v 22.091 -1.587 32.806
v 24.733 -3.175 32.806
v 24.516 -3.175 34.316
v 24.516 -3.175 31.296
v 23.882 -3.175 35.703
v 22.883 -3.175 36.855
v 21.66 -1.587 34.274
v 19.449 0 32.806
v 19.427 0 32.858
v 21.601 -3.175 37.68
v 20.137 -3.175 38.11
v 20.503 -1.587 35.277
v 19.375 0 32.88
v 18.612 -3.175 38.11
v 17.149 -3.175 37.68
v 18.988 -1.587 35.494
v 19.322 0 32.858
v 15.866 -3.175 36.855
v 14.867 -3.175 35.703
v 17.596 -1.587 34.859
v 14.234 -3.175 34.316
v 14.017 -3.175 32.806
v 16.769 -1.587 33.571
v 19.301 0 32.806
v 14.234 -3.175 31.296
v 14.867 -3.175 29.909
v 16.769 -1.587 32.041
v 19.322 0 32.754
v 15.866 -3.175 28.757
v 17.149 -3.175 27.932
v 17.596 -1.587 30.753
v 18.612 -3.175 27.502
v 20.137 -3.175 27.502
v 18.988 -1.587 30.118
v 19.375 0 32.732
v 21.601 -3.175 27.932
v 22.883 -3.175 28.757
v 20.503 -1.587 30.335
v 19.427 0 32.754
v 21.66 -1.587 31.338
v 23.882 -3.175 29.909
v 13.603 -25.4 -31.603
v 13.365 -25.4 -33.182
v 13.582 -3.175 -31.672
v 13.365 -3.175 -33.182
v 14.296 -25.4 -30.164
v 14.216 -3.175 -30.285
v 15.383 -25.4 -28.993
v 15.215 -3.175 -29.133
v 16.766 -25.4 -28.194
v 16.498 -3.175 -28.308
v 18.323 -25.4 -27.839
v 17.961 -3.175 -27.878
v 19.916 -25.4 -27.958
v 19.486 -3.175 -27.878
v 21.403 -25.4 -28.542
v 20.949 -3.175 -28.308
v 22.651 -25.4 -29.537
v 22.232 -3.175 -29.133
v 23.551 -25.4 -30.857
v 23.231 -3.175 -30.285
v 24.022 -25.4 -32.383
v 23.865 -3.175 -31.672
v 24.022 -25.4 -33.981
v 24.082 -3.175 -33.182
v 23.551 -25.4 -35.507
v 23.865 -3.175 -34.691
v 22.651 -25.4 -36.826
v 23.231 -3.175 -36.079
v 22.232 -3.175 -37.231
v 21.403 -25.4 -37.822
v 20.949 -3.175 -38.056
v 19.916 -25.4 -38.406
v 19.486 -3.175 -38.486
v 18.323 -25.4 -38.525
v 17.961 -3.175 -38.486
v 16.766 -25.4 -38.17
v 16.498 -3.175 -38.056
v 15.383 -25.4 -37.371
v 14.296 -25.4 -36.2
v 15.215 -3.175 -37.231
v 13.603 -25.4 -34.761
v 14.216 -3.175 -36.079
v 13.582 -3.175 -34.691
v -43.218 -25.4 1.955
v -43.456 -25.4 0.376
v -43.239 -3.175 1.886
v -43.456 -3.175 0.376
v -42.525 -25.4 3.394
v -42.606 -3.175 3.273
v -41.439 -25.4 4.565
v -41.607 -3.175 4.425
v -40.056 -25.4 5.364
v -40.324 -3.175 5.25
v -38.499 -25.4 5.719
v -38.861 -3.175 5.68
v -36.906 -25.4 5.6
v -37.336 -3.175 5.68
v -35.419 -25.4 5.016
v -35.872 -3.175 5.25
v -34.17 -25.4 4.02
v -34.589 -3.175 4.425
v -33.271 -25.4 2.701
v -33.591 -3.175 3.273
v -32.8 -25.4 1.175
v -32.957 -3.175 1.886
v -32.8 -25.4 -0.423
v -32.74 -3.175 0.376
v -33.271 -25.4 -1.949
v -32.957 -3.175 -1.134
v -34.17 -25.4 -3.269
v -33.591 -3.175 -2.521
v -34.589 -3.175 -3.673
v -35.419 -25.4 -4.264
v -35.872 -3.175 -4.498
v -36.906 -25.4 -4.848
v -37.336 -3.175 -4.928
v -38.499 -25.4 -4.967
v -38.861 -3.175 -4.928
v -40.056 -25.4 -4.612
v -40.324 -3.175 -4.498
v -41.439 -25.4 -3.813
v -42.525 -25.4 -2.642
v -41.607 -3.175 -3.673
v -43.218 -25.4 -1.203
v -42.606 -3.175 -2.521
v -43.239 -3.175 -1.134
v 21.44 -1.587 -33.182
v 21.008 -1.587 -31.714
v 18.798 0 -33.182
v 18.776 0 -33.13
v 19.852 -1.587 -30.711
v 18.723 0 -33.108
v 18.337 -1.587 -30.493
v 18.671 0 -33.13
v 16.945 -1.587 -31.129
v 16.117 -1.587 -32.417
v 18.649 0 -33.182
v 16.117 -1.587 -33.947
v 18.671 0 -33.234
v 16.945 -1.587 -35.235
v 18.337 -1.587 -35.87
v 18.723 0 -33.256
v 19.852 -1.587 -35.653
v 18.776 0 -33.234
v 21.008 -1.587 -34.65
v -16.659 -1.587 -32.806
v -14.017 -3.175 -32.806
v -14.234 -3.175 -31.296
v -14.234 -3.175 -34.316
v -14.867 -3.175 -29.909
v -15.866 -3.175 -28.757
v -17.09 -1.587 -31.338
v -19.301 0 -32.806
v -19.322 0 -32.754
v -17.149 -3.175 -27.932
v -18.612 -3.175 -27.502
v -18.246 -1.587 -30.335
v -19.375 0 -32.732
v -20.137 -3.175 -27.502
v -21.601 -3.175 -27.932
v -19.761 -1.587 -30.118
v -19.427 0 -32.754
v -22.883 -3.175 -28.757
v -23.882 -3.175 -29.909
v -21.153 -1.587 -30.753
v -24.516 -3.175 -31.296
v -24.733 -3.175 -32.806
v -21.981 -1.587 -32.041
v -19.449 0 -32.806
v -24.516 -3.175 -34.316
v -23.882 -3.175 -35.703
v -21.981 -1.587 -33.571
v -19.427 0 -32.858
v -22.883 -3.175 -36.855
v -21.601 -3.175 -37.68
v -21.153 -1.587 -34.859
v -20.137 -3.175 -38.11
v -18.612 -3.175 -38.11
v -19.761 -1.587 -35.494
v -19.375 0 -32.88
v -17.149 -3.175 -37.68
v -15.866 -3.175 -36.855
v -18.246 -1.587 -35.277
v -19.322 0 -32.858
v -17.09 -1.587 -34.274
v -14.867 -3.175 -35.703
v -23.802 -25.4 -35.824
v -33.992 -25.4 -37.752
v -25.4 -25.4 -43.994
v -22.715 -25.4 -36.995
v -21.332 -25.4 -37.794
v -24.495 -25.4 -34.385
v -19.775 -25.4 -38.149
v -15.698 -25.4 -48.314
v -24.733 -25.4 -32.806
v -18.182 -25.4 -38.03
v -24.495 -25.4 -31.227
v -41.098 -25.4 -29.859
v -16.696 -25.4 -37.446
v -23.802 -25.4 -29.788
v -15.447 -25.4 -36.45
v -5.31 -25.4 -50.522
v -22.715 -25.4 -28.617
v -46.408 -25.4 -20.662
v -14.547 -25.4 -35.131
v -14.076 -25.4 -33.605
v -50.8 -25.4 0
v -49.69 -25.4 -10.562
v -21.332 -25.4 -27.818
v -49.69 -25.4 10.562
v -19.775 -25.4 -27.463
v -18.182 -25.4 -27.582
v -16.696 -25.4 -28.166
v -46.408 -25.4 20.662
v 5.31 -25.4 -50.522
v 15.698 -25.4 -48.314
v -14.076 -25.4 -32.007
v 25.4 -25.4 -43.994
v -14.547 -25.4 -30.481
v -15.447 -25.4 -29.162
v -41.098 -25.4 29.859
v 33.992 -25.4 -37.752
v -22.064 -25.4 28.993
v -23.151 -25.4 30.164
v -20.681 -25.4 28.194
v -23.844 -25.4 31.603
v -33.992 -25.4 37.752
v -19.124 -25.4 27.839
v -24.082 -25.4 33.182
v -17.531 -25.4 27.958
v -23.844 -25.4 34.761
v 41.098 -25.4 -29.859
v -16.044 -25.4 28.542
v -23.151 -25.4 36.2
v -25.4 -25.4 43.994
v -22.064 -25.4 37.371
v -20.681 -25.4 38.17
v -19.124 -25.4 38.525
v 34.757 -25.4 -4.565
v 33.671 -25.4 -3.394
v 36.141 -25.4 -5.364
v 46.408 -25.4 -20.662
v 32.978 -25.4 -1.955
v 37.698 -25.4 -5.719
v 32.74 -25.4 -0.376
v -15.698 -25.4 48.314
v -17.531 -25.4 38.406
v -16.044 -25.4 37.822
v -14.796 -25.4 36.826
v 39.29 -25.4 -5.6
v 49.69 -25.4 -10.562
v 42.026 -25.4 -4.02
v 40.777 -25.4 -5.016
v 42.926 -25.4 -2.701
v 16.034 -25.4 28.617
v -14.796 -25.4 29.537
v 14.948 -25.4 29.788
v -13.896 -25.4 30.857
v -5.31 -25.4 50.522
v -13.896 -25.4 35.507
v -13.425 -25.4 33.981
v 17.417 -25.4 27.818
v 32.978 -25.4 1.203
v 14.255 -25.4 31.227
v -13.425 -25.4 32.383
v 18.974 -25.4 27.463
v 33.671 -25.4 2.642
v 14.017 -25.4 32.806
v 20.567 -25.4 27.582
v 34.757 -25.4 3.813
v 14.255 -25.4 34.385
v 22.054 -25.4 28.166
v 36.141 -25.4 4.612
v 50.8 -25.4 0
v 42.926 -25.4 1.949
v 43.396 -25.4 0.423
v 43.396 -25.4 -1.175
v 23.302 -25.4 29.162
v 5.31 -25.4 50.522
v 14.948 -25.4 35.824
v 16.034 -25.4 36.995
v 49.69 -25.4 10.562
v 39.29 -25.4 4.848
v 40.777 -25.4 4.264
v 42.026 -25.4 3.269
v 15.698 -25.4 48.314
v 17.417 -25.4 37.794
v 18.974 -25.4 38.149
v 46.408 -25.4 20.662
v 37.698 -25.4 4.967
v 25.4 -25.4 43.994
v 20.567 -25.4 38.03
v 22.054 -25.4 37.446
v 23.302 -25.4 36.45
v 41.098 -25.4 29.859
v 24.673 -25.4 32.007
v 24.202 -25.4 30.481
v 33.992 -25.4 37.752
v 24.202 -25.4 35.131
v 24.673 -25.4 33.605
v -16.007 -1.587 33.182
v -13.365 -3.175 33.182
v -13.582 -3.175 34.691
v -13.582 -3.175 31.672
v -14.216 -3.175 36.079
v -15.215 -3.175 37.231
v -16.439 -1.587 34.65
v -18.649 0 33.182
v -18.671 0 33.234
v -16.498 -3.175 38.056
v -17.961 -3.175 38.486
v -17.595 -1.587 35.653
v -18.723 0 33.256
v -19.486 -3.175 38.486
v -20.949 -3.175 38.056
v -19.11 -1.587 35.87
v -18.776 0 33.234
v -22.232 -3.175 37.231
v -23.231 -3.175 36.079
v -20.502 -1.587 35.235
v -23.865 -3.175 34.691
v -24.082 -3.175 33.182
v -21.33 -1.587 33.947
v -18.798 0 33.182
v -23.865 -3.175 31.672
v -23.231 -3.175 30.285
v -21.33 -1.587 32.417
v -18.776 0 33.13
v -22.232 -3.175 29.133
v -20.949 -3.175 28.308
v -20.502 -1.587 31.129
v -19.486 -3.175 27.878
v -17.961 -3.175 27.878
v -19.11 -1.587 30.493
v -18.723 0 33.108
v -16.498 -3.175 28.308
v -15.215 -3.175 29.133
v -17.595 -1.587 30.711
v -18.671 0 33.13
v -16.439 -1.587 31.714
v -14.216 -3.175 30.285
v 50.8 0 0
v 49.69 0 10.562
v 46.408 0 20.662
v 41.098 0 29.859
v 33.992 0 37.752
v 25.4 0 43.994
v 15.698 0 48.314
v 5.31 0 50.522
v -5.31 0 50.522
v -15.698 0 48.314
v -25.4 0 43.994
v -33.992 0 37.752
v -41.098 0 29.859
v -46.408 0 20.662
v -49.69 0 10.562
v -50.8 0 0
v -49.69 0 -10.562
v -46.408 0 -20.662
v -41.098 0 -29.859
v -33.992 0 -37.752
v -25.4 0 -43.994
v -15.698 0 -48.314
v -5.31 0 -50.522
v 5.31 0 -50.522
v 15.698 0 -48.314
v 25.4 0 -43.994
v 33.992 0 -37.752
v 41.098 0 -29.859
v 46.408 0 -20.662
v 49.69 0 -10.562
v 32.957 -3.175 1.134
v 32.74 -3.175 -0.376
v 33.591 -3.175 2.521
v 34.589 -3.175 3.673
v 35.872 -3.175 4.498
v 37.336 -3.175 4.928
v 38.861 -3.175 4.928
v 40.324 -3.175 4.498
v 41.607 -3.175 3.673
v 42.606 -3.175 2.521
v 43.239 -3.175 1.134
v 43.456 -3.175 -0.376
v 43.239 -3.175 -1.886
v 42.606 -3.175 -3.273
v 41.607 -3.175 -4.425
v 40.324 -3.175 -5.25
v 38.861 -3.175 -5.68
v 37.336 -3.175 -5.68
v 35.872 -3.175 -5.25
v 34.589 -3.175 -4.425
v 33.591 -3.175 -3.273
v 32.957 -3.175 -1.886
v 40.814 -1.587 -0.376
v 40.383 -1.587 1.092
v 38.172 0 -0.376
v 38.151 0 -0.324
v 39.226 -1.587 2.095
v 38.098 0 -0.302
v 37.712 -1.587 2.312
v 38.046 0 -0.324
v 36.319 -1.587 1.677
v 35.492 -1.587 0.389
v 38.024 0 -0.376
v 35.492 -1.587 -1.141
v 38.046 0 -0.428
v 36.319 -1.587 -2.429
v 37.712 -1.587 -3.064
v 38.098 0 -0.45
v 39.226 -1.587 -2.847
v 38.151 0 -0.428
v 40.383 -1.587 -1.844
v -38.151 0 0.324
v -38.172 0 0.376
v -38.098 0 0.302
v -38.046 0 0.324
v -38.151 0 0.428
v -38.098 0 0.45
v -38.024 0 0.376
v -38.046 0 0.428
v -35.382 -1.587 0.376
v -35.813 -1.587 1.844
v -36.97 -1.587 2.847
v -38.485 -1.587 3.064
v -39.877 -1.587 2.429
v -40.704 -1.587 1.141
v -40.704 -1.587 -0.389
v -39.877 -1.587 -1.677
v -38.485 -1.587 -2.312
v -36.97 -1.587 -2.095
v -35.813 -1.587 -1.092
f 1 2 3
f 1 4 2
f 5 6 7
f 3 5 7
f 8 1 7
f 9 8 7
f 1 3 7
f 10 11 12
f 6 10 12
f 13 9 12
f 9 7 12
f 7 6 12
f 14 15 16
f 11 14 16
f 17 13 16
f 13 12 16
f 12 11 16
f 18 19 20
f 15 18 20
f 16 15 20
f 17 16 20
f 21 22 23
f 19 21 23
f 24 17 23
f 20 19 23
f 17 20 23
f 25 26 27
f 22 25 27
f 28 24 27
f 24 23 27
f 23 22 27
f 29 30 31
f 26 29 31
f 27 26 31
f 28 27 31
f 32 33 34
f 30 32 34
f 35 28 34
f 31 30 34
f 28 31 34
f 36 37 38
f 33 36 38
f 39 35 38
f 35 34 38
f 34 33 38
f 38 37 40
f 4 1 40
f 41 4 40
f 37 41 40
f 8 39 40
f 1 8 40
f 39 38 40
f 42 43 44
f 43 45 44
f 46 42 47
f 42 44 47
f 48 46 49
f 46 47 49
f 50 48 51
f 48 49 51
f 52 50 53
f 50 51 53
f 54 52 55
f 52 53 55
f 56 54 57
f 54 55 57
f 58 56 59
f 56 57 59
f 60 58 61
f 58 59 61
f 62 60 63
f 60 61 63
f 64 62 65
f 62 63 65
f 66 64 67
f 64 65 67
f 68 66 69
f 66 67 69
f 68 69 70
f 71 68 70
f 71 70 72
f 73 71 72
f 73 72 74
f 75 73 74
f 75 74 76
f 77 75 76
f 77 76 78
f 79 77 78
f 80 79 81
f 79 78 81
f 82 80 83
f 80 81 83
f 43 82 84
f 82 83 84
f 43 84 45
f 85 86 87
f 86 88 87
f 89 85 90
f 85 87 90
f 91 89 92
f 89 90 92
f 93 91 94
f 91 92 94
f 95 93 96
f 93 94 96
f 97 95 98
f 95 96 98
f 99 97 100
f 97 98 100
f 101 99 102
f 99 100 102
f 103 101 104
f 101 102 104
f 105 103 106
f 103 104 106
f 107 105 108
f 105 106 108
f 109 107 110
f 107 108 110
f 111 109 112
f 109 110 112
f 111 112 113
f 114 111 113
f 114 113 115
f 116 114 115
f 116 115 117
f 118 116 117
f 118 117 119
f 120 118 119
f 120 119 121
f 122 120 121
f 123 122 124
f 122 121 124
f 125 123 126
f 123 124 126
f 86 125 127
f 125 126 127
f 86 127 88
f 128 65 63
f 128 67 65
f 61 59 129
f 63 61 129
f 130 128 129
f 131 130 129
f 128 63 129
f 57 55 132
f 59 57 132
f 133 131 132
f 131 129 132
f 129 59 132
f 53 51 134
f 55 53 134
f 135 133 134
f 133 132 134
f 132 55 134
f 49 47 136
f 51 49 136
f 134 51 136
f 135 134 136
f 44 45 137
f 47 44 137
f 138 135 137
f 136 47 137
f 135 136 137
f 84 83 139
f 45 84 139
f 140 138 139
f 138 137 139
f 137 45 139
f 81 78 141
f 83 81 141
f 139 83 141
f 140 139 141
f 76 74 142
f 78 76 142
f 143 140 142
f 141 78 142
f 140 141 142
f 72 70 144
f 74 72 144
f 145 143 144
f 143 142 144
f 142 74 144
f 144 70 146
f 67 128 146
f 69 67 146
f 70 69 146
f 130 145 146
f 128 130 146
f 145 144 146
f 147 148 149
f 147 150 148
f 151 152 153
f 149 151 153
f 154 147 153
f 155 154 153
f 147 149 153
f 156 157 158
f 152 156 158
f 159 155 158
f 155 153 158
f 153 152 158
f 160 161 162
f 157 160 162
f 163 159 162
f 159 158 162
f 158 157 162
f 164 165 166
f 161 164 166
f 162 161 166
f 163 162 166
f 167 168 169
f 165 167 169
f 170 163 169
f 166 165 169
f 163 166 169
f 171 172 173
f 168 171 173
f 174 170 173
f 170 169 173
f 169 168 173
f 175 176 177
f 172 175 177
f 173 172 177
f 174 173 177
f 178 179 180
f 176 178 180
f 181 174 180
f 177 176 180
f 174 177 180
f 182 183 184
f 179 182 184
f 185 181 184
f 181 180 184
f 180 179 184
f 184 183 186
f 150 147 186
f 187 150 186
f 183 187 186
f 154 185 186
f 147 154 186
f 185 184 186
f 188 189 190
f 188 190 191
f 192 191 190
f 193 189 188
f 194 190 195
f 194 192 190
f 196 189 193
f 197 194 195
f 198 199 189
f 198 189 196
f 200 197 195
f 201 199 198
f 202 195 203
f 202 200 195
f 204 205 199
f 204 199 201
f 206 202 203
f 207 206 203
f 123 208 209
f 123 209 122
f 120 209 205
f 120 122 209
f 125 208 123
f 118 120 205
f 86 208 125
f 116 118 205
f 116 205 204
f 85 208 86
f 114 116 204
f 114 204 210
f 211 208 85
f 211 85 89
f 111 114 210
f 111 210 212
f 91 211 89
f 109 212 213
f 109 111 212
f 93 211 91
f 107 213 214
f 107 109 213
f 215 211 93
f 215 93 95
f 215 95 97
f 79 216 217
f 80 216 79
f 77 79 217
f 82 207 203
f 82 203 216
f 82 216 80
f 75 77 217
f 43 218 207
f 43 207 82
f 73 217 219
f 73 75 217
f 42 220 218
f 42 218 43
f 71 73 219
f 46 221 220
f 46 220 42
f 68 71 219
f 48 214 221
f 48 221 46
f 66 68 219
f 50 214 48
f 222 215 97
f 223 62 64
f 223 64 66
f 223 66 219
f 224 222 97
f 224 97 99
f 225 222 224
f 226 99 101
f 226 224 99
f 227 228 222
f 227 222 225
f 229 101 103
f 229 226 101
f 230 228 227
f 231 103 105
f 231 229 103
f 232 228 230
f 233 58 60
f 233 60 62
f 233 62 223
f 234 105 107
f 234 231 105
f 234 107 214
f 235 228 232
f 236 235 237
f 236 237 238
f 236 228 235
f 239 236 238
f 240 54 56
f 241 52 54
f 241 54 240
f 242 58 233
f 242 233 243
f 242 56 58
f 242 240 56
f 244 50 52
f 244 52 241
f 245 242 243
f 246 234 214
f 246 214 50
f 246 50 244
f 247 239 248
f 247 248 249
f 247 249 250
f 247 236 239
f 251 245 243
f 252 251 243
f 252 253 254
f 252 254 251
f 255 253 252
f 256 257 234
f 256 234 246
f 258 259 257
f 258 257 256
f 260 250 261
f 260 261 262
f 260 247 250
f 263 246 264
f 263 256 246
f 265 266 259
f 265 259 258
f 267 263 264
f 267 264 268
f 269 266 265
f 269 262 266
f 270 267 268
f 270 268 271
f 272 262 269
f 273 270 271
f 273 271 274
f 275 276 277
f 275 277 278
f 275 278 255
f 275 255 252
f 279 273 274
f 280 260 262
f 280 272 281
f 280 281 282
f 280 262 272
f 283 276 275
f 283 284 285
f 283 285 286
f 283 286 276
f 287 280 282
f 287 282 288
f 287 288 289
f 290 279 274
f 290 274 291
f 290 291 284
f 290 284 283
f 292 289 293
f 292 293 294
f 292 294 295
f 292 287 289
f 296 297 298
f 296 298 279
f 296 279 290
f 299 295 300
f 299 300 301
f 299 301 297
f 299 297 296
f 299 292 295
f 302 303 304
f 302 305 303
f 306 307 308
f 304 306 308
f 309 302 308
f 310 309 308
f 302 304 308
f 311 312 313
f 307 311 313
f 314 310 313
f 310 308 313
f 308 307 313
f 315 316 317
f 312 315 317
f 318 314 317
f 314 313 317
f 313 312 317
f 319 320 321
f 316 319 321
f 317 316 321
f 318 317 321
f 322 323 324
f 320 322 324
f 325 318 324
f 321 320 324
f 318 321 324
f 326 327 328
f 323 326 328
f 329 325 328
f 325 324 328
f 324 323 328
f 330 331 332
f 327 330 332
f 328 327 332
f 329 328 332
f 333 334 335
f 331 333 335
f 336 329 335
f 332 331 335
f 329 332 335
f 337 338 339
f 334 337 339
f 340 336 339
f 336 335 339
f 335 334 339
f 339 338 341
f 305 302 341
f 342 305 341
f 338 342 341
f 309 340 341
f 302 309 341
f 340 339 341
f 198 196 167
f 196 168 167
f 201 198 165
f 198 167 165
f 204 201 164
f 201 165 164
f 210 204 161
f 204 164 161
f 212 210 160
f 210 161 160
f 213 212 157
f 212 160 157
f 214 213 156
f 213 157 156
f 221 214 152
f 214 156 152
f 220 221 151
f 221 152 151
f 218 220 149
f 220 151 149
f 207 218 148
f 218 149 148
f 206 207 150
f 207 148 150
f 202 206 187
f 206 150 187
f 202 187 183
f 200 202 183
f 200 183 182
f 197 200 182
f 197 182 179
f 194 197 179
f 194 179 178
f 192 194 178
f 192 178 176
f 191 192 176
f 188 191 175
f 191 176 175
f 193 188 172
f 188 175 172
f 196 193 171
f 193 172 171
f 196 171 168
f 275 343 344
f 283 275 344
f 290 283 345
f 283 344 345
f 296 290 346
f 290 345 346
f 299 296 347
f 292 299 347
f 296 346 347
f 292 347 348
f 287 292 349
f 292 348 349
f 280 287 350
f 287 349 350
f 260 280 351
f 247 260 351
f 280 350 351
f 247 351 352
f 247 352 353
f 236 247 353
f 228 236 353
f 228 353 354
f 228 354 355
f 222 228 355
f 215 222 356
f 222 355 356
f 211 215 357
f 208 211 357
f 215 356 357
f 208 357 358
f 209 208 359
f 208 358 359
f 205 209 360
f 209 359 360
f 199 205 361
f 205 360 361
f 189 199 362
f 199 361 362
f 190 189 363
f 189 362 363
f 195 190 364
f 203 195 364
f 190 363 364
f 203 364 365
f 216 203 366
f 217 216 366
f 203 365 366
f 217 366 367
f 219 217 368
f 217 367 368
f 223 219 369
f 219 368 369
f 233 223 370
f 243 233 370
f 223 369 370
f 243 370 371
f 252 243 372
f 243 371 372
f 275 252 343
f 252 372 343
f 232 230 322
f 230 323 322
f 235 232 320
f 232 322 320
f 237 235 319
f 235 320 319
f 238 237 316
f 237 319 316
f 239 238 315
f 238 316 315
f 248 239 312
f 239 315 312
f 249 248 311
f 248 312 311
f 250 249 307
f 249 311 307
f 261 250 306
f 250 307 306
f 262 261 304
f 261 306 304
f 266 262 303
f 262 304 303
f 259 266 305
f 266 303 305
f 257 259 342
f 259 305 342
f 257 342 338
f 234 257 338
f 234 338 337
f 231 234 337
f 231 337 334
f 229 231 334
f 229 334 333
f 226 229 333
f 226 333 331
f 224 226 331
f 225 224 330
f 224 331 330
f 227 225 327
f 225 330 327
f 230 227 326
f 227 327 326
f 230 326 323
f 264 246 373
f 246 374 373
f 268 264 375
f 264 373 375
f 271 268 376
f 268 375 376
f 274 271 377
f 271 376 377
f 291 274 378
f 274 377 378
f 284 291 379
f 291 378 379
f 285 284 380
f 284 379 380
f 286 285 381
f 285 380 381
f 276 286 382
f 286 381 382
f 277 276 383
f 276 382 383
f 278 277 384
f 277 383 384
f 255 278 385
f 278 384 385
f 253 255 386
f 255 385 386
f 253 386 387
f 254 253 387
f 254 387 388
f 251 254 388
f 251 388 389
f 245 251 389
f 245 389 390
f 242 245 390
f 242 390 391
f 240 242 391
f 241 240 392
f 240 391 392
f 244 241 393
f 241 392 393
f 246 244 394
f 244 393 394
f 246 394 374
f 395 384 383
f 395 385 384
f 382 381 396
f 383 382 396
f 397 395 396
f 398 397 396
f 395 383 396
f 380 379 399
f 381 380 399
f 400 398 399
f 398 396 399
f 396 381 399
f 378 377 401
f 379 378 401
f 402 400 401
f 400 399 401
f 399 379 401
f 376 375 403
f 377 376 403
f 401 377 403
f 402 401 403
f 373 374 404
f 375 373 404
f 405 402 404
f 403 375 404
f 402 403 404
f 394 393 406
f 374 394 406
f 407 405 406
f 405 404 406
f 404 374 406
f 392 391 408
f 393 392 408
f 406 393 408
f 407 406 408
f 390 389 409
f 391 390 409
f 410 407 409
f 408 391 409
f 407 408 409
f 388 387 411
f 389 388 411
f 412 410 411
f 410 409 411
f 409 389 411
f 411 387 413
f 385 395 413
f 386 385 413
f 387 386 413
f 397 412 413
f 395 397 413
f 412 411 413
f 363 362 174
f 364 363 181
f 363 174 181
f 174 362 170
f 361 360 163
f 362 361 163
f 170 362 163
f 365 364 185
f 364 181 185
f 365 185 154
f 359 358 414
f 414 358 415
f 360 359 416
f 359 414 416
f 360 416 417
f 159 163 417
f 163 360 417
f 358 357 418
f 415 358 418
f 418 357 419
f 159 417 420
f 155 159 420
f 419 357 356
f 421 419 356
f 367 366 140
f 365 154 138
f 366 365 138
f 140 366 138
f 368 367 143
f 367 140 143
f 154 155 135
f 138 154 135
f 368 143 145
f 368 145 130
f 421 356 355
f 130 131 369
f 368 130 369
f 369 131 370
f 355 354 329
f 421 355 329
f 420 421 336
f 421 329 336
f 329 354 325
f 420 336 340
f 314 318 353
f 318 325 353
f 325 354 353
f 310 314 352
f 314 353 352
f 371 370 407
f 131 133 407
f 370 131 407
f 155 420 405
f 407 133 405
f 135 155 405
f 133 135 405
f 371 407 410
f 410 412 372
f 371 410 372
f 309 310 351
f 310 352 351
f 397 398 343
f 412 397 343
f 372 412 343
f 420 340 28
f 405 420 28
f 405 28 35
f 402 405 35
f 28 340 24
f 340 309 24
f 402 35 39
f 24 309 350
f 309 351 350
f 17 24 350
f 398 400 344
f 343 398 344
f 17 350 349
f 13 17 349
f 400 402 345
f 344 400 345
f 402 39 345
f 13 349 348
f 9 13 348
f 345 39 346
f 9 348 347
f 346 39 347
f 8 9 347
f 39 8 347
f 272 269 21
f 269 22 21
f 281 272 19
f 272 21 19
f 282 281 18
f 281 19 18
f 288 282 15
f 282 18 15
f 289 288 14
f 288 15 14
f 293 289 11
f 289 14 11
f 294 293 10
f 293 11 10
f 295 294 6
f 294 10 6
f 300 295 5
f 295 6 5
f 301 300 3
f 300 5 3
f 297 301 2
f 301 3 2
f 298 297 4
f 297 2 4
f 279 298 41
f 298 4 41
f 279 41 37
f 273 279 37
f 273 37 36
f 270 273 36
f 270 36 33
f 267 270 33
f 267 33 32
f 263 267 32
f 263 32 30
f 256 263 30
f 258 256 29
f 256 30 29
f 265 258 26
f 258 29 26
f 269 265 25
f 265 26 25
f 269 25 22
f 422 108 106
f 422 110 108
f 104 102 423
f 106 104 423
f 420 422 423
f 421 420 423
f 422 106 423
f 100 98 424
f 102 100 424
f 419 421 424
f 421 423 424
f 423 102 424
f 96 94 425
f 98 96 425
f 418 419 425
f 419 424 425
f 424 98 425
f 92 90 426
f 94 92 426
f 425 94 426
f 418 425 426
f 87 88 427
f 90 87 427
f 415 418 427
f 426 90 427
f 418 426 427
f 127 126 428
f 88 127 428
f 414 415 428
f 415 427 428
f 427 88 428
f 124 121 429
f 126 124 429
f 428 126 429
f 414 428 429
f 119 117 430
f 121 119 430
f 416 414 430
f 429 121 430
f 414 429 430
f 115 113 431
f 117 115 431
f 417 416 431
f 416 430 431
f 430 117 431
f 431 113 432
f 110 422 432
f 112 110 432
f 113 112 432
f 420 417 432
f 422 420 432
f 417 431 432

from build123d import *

# Parameters (mm, degrees)
F0_R     = 50.8
F1_DEPTH = 25.4
F3_D     = 10.71626
F3_DEPTH = 22.225
F3_TIP   = 3.2194893086


with BuildPart() as f1:
    # F0 (on Front) → F1 (new body)
    with BuildSketch(Plane.XZ):
        Circle(F0_R)
    extrude(amount=F1_DEPTH)

    # F3
    with Locations(Plane.XZ.offset(25.4)):
        with Locations((-38.0981450941, 0.3759526402), (-18.7234880101, 33.1819378087), (19.3746570841, 32.8059851685), (38.0981450941, -0.3759526402), (18.7234880101, -33.1819378087), (-19.3746570841, -32.8059851685)):
            Hole(F3_D / 2, depth=F3_DEPTH)
            with Locations((0, 0, -(F3_DEPTH + F3_TIP / 2))):  # 118° drill point
                Cone(0, F3_D / 2, F3_TIP, mode=Mode.SUBTRACT)


solid = f1.part
